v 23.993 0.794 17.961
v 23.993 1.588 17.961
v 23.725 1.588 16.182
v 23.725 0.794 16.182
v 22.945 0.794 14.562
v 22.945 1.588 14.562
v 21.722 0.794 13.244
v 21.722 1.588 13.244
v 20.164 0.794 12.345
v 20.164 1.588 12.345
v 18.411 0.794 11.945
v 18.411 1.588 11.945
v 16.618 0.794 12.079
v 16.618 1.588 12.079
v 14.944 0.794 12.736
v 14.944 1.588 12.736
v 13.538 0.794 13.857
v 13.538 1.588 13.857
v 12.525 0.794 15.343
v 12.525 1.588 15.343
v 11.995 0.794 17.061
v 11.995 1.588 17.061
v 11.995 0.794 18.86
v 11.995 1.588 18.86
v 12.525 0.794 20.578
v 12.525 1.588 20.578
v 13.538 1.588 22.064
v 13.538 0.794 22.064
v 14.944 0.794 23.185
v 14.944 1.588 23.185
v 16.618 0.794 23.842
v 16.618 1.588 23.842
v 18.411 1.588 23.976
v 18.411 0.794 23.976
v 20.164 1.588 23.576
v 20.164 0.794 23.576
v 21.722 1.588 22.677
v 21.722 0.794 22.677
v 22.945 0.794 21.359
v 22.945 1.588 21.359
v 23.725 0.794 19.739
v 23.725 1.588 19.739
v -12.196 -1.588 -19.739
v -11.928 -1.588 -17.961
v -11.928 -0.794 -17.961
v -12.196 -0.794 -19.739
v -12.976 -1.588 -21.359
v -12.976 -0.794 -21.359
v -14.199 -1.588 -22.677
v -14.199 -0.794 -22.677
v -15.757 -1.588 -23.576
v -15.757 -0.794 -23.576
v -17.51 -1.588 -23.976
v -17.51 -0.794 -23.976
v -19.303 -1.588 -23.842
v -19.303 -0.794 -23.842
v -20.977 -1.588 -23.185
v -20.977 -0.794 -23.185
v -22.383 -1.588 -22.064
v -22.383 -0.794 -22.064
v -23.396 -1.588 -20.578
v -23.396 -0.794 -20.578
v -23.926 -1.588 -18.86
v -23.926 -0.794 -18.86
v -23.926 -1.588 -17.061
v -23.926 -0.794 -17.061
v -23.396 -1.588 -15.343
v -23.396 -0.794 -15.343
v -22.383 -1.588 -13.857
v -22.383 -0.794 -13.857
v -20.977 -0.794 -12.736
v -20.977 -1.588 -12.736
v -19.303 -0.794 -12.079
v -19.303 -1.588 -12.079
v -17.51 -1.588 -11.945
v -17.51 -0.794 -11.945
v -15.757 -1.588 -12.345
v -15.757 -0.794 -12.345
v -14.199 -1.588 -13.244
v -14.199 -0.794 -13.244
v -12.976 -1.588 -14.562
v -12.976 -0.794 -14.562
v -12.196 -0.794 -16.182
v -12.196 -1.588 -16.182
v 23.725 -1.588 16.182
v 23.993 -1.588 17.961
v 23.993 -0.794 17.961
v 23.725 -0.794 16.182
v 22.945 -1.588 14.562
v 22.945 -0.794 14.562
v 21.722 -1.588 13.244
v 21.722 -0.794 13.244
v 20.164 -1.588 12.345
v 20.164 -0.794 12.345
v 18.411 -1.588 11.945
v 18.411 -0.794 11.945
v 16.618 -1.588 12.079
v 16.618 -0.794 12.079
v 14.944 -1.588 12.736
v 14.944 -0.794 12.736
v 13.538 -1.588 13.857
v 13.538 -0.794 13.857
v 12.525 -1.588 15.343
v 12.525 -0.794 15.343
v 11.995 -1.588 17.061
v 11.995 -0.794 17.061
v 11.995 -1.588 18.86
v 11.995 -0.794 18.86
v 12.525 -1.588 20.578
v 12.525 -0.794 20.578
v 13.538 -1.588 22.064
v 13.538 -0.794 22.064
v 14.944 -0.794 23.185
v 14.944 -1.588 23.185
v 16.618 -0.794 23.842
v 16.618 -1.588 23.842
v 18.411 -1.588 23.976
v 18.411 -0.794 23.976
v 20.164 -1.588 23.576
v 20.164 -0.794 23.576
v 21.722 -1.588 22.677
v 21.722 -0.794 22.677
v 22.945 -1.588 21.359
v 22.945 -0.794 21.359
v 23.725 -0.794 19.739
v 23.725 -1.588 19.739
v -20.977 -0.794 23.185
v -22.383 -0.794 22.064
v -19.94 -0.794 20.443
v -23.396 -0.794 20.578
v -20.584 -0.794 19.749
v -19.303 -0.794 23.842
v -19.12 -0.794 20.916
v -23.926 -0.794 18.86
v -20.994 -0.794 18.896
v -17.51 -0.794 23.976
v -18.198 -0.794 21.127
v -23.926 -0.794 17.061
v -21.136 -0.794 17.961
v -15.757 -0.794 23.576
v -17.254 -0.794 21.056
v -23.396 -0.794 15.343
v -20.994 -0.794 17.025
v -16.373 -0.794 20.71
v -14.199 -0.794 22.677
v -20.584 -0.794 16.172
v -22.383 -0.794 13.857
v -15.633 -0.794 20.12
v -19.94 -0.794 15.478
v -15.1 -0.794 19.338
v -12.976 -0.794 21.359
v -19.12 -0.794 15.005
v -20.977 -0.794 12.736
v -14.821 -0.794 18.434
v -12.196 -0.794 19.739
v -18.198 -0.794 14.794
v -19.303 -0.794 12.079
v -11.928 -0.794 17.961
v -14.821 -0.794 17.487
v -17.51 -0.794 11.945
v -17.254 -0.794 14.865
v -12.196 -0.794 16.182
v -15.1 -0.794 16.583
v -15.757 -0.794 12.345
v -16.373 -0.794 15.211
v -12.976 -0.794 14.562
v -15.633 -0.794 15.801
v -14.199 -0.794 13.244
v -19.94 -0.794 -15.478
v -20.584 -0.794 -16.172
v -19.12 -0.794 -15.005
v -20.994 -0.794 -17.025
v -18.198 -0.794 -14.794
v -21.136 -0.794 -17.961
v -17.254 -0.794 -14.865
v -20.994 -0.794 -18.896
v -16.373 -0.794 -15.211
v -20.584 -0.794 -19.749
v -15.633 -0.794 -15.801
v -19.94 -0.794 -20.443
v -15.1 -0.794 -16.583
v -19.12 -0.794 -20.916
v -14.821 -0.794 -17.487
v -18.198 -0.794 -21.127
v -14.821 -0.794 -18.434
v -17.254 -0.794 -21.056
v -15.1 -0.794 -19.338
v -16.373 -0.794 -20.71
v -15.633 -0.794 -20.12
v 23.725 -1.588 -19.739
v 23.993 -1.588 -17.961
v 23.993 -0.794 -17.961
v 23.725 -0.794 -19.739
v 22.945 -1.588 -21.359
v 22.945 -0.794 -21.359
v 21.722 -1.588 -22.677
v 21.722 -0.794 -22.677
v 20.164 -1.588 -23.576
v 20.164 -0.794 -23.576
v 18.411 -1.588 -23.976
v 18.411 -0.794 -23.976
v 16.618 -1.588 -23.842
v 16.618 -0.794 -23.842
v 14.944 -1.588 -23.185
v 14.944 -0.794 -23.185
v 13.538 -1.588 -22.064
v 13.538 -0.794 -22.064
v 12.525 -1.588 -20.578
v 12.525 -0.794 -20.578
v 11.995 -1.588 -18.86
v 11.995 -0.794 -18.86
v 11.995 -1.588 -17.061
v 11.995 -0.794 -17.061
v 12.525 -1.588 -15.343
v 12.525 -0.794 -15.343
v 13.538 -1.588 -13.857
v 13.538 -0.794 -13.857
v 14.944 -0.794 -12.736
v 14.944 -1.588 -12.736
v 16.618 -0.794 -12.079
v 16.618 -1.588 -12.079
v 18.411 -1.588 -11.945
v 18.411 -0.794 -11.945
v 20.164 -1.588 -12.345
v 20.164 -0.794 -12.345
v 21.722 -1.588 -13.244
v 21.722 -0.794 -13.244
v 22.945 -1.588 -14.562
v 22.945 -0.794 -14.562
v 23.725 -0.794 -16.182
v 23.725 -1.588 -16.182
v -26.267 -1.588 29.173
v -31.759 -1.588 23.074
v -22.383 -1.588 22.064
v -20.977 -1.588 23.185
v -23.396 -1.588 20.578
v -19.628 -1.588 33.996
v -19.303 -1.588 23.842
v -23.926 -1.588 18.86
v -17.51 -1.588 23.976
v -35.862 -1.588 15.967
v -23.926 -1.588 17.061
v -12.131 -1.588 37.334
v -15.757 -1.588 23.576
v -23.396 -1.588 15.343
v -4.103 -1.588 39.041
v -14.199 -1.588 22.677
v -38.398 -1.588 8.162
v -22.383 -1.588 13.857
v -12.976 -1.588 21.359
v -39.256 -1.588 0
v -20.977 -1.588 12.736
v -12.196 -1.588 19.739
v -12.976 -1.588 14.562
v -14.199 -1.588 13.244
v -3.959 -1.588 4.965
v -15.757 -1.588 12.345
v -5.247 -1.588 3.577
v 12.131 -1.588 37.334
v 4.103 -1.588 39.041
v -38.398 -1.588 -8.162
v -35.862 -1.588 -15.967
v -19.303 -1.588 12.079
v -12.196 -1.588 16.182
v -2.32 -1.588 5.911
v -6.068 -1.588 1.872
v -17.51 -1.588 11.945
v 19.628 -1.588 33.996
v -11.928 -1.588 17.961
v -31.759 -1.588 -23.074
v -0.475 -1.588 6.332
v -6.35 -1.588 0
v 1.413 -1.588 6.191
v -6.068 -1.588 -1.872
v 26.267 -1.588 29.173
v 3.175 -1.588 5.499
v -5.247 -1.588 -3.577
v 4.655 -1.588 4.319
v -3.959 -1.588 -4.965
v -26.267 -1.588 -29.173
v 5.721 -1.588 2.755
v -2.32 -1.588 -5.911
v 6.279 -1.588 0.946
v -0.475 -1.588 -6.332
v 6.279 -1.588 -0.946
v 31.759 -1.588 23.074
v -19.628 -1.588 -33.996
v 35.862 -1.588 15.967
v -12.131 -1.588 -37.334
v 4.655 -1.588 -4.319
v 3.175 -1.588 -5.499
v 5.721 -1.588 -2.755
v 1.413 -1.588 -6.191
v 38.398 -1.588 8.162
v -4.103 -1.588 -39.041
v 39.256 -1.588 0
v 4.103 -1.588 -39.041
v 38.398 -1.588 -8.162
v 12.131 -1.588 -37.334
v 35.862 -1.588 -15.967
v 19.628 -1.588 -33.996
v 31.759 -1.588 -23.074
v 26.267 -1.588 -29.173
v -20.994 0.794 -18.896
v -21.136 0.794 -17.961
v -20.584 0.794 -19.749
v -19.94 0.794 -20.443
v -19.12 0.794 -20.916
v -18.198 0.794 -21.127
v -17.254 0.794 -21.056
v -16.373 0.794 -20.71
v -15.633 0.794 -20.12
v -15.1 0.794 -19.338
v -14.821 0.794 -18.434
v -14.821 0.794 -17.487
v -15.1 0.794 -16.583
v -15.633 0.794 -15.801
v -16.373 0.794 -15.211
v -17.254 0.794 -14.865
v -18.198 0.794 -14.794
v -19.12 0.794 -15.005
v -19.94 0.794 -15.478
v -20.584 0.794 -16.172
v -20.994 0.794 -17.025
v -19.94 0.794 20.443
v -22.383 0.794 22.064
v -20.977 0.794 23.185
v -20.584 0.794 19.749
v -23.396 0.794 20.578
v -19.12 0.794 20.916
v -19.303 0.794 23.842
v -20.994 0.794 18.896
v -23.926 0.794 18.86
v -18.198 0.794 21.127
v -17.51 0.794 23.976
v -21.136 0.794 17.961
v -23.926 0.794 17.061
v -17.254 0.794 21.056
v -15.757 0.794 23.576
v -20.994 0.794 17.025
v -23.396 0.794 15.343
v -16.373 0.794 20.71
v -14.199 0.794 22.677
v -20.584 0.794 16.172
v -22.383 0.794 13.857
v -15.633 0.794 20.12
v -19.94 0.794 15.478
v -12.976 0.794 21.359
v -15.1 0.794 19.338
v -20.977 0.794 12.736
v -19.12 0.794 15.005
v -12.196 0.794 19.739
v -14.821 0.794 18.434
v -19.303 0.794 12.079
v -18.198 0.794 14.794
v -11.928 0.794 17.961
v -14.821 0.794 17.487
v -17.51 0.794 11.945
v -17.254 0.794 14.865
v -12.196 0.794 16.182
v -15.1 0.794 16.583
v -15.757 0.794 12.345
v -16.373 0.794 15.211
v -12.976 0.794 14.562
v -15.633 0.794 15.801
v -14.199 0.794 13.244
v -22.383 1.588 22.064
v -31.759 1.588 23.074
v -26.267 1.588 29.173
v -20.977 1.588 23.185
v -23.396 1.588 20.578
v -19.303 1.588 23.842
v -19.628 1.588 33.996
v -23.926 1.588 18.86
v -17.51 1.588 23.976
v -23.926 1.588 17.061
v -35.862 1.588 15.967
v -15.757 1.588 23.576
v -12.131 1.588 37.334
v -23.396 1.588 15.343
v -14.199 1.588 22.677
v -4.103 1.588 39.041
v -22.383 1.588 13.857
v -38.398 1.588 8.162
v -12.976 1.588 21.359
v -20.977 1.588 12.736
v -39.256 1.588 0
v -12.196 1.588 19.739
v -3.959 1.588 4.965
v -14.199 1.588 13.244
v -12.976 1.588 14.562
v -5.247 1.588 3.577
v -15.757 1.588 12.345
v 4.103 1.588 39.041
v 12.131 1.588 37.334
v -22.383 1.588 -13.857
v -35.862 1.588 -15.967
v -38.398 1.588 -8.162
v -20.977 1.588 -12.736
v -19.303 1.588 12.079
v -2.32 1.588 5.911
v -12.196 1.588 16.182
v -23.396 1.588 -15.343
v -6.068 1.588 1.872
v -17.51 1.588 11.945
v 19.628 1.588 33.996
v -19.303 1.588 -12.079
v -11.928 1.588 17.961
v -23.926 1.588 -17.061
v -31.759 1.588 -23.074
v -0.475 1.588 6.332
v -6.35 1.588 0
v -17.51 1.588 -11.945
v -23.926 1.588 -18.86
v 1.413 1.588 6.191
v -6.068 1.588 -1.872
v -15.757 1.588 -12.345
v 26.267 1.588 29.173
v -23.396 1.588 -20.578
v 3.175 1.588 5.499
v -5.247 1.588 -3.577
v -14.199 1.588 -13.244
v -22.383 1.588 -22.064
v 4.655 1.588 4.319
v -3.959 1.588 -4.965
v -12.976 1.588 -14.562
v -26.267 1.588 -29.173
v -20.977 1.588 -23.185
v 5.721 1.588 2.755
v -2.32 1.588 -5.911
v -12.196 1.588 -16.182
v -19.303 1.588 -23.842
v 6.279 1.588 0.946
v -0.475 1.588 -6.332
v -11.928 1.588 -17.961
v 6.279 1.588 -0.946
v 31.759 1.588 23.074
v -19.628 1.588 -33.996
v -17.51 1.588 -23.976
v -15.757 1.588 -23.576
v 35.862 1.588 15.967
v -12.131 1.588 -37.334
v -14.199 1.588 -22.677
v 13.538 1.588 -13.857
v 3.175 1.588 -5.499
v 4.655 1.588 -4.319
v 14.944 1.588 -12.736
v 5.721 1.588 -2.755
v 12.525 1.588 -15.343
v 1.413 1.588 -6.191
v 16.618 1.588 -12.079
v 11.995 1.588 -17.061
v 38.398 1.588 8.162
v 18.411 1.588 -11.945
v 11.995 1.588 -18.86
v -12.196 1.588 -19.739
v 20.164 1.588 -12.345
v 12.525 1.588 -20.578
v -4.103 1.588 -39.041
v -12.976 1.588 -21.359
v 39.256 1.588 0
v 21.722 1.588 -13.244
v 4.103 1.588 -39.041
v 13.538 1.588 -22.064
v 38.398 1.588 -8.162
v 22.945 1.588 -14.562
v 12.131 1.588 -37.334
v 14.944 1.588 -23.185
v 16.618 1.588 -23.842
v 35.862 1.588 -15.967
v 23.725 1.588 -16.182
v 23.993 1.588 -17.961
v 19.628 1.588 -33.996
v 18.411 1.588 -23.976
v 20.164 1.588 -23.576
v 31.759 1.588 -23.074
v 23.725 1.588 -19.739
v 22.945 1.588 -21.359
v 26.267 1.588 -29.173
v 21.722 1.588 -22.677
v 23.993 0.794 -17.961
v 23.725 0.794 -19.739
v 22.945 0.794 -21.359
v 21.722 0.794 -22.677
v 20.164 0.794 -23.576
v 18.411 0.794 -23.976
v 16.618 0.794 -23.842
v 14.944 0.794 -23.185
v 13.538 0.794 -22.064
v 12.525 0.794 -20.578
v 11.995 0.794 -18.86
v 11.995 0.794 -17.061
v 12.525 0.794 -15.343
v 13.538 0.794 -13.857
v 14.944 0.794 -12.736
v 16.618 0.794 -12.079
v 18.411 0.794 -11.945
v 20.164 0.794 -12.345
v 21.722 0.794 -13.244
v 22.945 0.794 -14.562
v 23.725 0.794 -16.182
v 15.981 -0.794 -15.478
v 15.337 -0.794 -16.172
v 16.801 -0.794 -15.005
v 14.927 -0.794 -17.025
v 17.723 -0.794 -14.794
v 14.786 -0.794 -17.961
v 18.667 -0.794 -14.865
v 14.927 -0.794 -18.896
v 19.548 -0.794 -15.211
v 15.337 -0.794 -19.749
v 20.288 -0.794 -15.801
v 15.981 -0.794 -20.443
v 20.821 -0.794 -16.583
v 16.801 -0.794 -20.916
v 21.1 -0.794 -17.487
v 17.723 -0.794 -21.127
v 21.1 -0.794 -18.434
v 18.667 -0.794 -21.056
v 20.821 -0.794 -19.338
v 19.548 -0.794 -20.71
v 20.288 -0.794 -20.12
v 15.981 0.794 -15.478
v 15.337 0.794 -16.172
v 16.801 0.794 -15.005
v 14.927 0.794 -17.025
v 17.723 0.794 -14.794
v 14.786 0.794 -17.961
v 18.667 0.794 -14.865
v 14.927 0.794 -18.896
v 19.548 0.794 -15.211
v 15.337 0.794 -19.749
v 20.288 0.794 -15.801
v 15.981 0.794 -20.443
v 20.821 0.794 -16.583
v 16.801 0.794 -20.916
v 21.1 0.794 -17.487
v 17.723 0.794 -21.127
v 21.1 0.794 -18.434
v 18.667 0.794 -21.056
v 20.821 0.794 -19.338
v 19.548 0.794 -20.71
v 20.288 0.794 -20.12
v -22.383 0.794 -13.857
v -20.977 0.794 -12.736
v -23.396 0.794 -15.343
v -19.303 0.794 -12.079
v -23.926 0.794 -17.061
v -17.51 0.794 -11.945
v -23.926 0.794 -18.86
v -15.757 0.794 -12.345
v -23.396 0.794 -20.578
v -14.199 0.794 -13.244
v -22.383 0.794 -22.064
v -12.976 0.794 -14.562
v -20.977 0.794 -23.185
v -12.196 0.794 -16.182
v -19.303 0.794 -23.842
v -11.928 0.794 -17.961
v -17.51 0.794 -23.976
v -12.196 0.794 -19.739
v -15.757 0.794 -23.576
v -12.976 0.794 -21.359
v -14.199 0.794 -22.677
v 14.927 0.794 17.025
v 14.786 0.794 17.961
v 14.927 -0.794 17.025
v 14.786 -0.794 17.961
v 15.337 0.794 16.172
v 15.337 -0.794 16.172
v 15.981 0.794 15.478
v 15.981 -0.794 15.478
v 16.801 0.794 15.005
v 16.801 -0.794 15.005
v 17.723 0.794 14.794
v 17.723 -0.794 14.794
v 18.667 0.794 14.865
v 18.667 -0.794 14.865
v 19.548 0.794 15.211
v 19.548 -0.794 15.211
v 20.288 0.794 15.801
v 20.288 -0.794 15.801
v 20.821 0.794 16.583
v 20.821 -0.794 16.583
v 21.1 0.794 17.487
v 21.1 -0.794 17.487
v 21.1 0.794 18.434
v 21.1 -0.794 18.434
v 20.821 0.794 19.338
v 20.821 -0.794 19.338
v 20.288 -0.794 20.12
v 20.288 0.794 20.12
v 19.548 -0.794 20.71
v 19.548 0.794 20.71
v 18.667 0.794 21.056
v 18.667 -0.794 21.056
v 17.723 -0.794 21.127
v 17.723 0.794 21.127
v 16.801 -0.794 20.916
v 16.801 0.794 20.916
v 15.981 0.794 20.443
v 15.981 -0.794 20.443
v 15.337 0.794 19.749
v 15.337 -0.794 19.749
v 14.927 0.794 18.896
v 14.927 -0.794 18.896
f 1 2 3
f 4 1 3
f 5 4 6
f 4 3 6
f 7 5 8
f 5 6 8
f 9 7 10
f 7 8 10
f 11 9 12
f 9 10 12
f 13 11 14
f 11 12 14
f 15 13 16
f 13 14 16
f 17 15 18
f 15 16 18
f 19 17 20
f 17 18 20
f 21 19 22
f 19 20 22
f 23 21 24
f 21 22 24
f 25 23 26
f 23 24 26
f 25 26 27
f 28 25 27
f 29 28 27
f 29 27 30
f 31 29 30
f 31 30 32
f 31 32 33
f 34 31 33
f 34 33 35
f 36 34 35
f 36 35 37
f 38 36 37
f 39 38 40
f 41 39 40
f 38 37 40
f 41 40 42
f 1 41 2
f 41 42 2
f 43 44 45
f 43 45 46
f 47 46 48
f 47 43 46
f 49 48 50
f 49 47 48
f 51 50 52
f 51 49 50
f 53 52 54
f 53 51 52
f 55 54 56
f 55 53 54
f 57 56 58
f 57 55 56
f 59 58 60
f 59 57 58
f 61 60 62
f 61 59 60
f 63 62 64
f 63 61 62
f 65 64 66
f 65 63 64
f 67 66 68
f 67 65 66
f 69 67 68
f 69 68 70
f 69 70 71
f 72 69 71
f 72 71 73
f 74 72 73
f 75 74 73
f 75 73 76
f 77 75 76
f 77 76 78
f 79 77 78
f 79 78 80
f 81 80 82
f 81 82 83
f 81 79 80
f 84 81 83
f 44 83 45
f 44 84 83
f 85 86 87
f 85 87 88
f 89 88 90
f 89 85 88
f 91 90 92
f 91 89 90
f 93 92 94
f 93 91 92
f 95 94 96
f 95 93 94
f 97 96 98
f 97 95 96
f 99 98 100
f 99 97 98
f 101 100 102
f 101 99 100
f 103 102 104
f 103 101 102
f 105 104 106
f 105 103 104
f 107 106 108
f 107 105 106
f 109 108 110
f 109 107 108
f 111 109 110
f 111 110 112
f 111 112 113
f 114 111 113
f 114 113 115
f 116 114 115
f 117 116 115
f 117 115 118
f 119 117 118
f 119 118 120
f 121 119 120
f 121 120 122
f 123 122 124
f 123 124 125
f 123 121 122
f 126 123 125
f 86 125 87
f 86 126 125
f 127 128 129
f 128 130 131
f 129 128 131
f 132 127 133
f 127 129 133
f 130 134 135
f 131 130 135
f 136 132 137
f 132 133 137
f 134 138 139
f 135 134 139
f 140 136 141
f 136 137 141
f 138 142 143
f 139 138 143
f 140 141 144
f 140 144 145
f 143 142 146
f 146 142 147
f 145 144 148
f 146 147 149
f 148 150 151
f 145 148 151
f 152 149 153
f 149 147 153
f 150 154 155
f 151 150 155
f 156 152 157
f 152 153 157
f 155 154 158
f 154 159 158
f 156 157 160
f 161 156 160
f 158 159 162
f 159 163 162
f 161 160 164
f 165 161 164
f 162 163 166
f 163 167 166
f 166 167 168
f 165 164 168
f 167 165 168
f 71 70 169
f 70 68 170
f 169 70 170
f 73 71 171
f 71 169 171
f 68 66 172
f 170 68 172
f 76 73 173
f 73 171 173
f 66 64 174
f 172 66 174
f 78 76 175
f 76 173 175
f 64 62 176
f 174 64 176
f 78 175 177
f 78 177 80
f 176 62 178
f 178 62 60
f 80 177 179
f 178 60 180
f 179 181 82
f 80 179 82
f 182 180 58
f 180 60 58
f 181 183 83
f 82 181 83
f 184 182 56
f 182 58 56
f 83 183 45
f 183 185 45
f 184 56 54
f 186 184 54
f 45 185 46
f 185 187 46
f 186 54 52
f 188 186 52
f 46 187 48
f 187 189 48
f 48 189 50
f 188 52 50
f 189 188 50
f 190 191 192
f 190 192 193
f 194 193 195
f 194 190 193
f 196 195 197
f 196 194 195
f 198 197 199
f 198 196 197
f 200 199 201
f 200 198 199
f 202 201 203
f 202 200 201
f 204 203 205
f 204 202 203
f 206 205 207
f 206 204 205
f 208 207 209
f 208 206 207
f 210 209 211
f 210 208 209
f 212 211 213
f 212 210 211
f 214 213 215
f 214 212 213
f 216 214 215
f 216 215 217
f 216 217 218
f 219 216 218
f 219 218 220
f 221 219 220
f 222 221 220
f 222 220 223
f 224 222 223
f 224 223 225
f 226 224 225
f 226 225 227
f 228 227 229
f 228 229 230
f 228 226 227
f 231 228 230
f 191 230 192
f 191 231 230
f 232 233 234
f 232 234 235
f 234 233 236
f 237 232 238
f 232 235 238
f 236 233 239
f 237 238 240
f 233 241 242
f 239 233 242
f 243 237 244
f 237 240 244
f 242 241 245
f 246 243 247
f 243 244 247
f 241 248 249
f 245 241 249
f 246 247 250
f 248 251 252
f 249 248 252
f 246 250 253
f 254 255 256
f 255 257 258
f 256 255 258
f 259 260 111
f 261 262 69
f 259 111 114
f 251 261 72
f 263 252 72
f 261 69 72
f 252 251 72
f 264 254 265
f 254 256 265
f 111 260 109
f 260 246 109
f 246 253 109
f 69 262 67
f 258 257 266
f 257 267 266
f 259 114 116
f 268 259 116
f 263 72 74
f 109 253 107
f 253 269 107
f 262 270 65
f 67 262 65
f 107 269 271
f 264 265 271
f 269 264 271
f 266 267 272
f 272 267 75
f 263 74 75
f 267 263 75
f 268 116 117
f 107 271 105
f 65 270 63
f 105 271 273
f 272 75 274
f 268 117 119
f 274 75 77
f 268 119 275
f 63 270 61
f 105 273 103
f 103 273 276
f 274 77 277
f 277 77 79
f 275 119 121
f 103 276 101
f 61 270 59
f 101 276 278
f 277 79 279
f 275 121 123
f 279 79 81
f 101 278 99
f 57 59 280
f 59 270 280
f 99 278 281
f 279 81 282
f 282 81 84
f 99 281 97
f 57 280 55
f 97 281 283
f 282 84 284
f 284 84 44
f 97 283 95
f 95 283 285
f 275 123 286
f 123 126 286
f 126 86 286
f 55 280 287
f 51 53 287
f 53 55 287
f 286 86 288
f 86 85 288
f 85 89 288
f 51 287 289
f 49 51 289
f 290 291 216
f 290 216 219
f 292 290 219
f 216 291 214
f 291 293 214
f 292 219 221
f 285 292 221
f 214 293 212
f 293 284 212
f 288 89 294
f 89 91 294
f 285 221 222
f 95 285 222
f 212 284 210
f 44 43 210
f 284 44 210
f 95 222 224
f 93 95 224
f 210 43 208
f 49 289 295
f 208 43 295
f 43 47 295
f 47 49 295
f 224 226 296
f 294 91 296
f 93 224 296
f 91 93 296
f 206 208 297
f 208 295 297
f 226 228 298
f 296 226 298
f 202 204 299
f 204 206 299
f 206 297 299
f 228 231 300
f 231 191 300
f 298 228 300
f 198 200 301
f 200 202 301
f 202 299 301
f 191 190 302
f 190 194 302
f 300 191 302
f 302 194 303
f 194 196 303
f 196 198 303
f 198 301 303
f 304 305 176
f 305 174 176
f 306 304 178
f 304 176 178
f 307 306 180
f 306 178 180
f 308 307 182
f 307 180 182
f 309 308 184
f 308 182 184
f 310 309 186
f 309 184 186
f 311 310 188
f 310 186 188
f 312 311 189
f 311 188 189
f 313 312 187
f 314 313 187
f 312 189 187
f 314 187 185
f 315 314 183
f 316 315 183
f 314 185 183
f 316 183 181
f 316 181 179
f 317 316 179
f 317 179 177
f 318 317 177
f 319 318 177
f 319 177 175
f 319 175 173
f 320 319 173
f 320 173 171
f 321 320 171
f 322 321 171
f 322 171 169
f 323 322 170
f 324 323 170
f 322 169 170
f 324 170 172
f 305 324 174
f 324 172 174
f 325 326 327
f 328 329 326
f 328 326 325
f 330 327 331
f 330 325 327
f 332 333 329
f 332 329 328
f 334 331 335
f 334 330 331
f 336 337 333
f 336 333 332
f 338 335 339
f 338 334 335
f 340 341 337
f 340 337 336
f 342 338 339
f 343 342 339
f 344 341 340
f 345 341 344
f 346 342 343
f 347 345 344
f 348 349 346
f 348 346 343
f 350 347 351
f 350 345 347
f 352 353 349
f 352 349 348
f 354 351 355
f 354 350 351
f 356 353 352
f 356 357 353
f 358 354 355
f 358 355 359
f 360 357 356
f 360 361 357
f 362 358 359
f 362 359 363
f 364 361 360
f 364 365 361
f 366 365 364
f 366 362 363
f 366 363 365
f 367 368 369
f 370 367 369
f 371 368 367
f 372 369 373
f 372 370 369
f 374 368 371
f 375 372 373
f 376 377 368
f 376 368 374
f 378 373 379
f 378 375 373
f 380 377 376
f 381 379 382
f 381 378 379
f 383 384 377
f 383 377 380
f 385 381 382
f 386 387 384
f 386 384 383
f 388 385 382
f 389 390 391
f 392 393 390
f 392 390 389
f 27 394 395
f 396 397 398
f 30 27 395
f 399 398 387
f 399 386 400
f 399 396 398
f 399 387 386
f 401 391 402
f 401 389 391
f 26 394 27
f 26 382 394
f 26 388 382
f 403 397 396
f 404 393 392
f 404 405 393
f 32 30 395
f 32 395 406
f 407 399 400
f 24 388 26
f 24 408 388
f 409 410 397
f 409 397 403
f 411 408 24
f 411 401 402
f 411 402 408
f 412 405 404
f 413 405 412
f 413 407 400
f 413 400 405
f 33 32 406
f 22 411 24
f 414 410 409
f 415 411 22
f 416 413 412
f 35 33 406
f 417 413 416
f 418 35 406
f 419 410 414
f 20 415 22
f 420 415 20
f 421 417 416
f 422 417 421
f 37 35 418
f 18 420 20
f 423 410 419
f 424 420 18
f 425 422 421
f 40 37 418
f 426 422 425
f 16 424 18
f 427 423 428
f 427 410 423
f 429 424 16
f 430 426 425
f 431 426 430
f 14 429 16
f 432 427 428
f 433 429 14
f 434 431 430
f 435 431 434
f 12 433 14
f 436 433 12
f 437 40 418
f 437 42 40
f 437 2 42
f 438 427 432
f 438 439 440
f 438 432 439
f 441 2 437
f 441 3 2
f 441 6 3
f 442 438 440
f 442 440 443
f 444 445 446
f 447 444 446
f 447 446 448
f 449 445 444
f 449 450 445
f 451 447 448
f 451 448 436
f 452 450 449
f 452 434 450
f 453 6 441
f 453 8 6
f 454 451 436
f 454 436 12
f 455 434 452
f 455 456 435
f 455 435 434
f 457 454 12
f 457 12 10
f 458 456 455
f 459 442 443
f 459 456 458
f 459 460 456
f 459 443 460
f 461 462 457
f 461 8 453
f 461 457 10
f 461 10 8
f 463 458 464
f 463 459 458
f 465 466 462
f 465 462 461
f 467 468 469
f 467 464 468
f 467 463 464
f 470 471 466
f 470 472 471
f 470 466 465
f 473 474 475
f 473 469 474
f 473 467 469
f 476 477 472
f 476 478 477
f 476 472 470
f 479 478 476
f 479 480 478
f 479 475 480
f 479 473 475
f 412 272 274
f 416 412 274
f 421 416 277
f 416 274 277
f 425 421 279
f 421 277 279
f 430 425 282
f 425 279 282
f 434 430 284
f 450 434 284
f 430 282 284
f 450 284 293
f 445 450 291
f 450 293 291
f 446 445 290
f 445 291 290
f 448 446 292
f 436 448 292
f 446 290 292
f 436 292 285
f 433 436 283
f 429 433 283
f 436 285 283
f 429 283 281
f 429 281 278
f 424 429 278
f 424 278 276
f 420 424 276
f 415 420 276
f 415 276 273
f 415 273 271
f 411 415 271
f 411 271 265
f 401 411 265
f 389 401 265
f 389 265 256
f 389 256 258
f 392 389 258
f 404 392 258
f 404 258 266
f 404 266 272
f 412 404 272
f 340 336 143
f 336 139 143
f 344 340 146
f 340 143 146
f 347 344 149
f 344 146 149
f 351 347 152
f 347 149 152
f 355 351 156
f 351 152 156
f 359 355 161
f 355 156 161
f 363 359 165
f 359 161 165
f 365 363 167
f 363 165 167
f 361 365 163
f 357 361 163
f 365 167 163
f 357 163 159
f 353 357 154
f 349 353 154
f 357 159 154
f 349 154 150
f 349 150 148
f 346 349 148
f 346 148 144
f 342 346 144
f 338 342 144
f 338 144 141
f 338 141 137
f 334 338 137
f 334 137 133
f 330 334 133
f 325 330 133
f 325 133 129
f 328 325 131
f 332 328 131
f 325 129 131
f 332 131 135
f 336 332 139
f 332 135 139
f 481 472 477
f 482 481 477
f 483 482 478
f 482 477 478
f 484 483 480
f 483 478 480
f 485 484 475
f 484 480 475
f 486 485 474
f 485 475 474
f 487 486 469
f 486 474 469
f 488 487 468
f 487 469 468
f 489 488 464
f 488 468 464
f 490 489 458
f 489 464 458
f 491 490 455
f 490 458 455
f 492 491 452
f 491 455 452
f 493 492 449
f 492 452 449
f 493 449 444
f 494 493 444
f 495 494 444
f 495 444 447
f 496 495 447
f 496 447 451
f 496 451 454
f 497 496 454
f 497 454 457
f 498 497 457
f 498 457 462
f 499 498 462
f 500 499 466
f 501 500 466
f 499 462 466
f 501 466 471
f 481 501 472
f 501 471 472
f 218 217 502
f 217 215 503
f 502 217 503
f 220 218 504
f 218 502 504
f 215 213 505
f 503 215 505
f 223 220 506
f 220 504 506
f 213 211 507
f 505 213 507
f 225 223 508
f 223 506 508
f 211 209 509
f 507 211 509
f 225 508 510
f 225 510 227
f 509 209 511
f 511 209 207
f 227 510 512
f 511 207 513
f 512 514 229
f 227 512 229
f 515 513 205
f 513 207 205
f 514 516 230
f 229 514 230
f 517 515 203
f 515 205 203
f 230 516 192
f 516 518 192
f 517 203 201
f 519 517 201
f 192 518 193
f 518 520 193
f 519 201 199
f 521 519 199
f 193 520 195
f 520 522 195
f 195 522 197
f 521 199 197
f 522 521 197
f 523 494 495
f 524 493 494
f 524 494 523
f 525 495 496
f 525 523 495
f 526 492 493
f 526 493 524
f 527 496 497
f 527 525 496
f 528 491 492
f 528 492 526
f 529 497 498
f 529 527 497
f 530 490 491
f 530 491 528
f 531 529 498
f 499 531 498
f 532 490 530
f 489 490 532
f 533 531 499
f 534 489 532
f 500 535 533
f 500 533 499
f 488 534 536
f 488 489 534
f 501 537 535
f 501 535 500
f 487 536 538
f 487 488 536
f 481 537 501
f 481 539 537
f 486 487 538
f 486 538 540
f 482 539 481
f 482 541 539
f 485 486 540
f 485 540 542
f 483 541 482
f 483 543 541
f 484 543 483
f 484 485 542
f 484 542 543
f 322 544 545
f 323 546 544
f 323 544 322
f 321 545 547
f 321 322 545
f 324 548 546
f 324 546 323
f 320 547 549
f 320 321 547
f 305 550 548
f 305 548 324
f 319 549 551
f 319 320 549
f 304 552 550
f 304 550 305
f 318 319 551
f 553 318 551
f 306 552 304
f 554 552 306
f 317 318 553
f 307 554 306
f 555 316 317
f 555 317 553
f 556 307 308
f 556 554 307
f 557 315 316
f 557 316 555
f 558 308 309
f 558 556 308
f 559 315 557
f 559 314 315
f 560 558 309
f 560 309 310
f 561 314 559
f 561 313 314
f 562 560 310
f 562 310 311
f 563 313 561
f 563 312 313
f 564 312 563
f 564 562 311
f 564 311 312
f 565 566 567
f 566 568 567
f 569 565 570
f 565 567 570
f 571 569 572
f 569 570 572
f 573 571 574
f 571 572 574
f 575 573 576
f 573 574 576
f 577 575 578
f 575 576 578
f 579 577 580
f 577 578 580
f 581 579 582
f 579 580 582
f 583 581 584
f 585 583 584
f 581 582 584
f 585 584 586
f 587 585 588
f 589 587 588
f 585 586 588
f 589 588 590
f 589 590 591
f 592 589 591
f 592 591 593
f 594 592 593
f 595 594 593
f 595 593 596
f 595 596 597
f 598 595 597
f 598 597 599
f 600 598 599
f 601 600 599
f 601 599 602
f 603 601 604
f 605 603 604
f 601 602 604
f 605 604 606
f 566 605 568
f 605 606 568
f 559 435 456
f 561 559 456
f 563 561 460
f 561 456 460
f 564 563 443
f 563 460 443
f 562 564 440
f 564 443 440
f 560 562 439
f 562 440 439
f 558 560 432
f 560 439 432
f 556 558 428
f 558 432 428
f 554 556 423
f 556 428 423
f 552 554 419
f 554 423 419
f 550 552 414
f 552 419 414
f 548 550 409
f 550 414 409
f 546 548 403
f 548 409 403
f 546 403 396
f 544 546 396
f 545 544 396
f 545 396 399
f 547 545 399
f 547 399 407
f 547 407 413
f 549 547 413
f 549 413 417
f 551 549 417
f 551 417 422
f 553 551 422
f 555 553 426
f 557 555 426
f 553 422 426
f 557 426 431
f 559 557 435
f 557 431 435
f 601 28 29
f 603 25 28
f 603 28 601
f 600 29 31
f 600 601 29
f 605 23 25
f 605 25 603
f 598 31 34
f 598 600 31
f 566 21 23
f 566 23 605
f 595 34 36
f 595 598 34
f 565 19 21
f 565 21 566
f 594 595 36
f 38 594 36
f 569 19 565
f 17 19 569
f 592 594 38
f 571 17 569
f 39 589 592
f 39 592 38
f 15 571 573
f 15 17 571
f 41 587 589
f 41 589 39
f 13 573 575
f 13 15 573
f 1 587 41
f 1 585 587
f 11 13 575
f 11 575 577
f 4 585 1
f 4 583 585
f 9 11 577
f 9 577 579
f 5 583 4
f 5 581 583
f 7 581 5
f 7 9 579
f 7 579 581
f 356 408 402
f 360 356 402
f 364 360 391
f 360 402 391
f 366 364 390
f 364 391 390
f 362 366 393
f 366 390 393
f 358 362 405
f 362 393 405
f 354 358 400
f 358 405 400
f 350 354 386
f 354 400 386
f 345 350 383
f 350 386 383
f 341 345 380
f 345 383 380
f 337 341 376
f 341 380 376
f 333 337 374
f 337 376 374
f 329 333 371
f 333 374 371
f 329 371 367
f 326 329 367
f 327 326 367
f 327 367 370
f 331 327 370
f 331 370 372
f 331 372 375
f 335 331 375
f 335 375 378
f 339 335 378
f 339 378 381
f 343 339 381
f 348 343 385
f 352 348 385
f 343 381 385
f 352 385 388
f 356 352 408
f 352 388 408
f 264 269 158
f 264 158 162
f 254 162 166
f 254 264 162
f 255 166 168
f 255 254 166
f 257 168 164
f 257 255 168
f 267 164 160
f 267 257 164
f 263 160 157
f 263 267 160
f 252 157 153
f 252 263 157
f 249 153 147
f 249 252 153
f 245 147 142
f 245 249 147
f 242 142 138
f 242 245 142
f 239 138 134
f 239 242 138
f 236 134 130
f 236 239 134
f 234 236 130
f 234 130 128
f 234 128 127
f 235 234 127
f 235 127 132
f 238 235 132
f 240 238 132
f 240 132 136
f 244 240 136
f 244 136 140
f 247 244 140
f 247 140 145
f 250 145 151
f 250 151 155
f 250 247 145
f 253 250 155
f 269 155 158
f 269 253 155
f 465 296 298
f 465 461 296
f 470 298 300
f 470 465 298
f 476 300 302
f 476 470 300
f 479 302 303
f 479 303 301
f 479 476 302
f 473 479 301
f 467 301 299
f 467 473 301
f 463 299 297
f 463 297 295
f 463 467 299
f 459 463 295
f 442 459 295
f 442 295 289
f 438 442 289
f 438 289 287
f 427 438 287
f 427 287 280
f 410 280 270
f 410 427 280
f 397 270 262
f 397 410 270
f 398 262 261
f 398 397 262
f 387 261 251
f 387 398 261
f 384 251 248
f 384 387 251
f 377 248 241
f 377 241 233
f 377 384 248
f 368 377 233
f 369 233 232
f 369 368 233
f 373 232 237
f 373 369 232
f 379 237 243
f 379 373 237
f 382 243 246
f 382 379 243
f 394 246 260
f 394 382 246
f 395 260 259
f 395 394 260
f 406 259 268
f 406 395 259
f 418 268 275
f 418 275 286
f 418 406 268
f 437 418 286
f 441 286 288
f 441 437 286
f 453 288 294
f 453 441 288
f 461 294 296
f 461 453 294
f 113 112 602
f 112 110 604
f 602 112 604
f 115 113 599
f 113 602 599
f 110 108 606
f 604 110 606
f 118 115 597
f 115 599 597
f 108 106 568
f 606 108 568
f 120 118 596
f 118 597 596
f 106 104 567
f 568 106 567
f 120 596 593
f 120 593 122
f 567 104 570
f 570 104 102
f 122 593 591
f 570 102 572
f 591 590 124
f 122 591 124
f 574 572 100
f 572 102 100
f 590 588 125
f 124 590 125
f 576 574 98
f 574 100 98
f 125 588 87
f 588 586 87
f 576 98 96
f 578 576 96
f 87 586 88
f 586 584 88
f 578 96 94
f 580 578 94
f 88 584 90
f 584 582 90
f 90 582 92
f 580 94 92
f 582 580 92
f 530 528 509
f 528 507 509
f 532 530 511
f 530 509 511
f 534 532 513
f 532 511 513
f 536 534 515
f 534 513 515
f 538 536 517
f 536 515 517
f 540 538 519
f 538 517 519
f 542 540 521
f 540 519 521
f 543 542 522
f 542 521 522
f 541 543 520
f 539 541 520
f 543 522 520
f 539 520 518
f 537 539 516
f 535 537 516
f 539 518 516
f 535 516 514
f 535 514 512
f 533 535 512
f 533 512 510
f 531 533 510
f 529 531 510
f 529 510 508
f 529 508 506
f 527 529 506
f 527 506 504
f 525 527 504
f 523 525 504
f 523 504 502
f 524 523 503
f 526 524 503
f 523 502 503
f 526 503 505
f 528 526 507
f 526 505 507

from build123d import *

# Parameters (mm, degrees)
SKETCH2_R                   = 39.2557
BOSS_EXTRUDE1_DEPTH         = 1.5875
F_1_4_0_25_DIAMETER_HOLE1_D = 6.35
F_1_2_0_5_DIAMETER_HOLE1_D  = 12.7
SKETCH10_R                  = 6.0325
CUT_EXTRUDE1_DEPTH          = 0.79375


with BuildPart() as part:
    # Sketch2 → Boss-Extrude1 (new body, symmetric)
    with BuildSketch(Plane(origin=(0, 0, 0), x_dir=(1, 0, 0), z_dir=(0, 1, 0))):
        Circle(SKETCH2_R)
    extrude(amount=BOSS_EXTRUDE1_DEPTH, both=True)

    # 1/4 (0.25) Diameter Hole1 (through all)
    with Locations(Plane(origin=(0, 1.5875, 0), x_dir=(1, 0, 0), z_dir=(0, 1, 0))):
        with Locations((-17.960512242, -17.960512242), (-17.960512242, 17.960512242), (17.960512242, 17.960512242), (17.960512242, -17.960512242)):
            Hole(F_1_4_0_25_DIAMETER_HOLE1_D / 2)

    # 1/2 (0.5) Diameter Hole1 (through all)
    with Locations(Plane(origin=(0, 1.5875, 0), x_dir=(1, 0, 0), z_dir=(0, 1, 0))):
        with Locations((0, 0)):
            Hole(F_1_2_0_5_DIAMETER_HOLE1_D / 2)

    # Sketch10 → Cut-Extrude1 (cut)
    with BuildSketch(Plane(origin=(0, 1.5875, 0), x_dir=(1, 0, 0), z_dir=(0, 1, 0))):
        with Locations((-17.960512242, 17.960512242)):
            Circle(SKETCH10_R)
        with Locations((17.960512242, 17.960512242)):
            Circle(SKETCH10_R)
        with Locations((17.960512242, -17.960512242)):
            Circle(SKETCH10_R)
        with Locations((-17.960512242, -17.960512242)):
            Circle(SKETCH10_R)
    cut_extrude1 = extrude(amount=-CUT_EXTRUDE1_DEPTH, mode=Mode.SUBTRACT)

    # Mirror1: Cut-Extrude1 across plane
    add(cut_extrude1.mirror(Plane.ZX), mode=Mode.SUBTRACT)


solid = part.part
